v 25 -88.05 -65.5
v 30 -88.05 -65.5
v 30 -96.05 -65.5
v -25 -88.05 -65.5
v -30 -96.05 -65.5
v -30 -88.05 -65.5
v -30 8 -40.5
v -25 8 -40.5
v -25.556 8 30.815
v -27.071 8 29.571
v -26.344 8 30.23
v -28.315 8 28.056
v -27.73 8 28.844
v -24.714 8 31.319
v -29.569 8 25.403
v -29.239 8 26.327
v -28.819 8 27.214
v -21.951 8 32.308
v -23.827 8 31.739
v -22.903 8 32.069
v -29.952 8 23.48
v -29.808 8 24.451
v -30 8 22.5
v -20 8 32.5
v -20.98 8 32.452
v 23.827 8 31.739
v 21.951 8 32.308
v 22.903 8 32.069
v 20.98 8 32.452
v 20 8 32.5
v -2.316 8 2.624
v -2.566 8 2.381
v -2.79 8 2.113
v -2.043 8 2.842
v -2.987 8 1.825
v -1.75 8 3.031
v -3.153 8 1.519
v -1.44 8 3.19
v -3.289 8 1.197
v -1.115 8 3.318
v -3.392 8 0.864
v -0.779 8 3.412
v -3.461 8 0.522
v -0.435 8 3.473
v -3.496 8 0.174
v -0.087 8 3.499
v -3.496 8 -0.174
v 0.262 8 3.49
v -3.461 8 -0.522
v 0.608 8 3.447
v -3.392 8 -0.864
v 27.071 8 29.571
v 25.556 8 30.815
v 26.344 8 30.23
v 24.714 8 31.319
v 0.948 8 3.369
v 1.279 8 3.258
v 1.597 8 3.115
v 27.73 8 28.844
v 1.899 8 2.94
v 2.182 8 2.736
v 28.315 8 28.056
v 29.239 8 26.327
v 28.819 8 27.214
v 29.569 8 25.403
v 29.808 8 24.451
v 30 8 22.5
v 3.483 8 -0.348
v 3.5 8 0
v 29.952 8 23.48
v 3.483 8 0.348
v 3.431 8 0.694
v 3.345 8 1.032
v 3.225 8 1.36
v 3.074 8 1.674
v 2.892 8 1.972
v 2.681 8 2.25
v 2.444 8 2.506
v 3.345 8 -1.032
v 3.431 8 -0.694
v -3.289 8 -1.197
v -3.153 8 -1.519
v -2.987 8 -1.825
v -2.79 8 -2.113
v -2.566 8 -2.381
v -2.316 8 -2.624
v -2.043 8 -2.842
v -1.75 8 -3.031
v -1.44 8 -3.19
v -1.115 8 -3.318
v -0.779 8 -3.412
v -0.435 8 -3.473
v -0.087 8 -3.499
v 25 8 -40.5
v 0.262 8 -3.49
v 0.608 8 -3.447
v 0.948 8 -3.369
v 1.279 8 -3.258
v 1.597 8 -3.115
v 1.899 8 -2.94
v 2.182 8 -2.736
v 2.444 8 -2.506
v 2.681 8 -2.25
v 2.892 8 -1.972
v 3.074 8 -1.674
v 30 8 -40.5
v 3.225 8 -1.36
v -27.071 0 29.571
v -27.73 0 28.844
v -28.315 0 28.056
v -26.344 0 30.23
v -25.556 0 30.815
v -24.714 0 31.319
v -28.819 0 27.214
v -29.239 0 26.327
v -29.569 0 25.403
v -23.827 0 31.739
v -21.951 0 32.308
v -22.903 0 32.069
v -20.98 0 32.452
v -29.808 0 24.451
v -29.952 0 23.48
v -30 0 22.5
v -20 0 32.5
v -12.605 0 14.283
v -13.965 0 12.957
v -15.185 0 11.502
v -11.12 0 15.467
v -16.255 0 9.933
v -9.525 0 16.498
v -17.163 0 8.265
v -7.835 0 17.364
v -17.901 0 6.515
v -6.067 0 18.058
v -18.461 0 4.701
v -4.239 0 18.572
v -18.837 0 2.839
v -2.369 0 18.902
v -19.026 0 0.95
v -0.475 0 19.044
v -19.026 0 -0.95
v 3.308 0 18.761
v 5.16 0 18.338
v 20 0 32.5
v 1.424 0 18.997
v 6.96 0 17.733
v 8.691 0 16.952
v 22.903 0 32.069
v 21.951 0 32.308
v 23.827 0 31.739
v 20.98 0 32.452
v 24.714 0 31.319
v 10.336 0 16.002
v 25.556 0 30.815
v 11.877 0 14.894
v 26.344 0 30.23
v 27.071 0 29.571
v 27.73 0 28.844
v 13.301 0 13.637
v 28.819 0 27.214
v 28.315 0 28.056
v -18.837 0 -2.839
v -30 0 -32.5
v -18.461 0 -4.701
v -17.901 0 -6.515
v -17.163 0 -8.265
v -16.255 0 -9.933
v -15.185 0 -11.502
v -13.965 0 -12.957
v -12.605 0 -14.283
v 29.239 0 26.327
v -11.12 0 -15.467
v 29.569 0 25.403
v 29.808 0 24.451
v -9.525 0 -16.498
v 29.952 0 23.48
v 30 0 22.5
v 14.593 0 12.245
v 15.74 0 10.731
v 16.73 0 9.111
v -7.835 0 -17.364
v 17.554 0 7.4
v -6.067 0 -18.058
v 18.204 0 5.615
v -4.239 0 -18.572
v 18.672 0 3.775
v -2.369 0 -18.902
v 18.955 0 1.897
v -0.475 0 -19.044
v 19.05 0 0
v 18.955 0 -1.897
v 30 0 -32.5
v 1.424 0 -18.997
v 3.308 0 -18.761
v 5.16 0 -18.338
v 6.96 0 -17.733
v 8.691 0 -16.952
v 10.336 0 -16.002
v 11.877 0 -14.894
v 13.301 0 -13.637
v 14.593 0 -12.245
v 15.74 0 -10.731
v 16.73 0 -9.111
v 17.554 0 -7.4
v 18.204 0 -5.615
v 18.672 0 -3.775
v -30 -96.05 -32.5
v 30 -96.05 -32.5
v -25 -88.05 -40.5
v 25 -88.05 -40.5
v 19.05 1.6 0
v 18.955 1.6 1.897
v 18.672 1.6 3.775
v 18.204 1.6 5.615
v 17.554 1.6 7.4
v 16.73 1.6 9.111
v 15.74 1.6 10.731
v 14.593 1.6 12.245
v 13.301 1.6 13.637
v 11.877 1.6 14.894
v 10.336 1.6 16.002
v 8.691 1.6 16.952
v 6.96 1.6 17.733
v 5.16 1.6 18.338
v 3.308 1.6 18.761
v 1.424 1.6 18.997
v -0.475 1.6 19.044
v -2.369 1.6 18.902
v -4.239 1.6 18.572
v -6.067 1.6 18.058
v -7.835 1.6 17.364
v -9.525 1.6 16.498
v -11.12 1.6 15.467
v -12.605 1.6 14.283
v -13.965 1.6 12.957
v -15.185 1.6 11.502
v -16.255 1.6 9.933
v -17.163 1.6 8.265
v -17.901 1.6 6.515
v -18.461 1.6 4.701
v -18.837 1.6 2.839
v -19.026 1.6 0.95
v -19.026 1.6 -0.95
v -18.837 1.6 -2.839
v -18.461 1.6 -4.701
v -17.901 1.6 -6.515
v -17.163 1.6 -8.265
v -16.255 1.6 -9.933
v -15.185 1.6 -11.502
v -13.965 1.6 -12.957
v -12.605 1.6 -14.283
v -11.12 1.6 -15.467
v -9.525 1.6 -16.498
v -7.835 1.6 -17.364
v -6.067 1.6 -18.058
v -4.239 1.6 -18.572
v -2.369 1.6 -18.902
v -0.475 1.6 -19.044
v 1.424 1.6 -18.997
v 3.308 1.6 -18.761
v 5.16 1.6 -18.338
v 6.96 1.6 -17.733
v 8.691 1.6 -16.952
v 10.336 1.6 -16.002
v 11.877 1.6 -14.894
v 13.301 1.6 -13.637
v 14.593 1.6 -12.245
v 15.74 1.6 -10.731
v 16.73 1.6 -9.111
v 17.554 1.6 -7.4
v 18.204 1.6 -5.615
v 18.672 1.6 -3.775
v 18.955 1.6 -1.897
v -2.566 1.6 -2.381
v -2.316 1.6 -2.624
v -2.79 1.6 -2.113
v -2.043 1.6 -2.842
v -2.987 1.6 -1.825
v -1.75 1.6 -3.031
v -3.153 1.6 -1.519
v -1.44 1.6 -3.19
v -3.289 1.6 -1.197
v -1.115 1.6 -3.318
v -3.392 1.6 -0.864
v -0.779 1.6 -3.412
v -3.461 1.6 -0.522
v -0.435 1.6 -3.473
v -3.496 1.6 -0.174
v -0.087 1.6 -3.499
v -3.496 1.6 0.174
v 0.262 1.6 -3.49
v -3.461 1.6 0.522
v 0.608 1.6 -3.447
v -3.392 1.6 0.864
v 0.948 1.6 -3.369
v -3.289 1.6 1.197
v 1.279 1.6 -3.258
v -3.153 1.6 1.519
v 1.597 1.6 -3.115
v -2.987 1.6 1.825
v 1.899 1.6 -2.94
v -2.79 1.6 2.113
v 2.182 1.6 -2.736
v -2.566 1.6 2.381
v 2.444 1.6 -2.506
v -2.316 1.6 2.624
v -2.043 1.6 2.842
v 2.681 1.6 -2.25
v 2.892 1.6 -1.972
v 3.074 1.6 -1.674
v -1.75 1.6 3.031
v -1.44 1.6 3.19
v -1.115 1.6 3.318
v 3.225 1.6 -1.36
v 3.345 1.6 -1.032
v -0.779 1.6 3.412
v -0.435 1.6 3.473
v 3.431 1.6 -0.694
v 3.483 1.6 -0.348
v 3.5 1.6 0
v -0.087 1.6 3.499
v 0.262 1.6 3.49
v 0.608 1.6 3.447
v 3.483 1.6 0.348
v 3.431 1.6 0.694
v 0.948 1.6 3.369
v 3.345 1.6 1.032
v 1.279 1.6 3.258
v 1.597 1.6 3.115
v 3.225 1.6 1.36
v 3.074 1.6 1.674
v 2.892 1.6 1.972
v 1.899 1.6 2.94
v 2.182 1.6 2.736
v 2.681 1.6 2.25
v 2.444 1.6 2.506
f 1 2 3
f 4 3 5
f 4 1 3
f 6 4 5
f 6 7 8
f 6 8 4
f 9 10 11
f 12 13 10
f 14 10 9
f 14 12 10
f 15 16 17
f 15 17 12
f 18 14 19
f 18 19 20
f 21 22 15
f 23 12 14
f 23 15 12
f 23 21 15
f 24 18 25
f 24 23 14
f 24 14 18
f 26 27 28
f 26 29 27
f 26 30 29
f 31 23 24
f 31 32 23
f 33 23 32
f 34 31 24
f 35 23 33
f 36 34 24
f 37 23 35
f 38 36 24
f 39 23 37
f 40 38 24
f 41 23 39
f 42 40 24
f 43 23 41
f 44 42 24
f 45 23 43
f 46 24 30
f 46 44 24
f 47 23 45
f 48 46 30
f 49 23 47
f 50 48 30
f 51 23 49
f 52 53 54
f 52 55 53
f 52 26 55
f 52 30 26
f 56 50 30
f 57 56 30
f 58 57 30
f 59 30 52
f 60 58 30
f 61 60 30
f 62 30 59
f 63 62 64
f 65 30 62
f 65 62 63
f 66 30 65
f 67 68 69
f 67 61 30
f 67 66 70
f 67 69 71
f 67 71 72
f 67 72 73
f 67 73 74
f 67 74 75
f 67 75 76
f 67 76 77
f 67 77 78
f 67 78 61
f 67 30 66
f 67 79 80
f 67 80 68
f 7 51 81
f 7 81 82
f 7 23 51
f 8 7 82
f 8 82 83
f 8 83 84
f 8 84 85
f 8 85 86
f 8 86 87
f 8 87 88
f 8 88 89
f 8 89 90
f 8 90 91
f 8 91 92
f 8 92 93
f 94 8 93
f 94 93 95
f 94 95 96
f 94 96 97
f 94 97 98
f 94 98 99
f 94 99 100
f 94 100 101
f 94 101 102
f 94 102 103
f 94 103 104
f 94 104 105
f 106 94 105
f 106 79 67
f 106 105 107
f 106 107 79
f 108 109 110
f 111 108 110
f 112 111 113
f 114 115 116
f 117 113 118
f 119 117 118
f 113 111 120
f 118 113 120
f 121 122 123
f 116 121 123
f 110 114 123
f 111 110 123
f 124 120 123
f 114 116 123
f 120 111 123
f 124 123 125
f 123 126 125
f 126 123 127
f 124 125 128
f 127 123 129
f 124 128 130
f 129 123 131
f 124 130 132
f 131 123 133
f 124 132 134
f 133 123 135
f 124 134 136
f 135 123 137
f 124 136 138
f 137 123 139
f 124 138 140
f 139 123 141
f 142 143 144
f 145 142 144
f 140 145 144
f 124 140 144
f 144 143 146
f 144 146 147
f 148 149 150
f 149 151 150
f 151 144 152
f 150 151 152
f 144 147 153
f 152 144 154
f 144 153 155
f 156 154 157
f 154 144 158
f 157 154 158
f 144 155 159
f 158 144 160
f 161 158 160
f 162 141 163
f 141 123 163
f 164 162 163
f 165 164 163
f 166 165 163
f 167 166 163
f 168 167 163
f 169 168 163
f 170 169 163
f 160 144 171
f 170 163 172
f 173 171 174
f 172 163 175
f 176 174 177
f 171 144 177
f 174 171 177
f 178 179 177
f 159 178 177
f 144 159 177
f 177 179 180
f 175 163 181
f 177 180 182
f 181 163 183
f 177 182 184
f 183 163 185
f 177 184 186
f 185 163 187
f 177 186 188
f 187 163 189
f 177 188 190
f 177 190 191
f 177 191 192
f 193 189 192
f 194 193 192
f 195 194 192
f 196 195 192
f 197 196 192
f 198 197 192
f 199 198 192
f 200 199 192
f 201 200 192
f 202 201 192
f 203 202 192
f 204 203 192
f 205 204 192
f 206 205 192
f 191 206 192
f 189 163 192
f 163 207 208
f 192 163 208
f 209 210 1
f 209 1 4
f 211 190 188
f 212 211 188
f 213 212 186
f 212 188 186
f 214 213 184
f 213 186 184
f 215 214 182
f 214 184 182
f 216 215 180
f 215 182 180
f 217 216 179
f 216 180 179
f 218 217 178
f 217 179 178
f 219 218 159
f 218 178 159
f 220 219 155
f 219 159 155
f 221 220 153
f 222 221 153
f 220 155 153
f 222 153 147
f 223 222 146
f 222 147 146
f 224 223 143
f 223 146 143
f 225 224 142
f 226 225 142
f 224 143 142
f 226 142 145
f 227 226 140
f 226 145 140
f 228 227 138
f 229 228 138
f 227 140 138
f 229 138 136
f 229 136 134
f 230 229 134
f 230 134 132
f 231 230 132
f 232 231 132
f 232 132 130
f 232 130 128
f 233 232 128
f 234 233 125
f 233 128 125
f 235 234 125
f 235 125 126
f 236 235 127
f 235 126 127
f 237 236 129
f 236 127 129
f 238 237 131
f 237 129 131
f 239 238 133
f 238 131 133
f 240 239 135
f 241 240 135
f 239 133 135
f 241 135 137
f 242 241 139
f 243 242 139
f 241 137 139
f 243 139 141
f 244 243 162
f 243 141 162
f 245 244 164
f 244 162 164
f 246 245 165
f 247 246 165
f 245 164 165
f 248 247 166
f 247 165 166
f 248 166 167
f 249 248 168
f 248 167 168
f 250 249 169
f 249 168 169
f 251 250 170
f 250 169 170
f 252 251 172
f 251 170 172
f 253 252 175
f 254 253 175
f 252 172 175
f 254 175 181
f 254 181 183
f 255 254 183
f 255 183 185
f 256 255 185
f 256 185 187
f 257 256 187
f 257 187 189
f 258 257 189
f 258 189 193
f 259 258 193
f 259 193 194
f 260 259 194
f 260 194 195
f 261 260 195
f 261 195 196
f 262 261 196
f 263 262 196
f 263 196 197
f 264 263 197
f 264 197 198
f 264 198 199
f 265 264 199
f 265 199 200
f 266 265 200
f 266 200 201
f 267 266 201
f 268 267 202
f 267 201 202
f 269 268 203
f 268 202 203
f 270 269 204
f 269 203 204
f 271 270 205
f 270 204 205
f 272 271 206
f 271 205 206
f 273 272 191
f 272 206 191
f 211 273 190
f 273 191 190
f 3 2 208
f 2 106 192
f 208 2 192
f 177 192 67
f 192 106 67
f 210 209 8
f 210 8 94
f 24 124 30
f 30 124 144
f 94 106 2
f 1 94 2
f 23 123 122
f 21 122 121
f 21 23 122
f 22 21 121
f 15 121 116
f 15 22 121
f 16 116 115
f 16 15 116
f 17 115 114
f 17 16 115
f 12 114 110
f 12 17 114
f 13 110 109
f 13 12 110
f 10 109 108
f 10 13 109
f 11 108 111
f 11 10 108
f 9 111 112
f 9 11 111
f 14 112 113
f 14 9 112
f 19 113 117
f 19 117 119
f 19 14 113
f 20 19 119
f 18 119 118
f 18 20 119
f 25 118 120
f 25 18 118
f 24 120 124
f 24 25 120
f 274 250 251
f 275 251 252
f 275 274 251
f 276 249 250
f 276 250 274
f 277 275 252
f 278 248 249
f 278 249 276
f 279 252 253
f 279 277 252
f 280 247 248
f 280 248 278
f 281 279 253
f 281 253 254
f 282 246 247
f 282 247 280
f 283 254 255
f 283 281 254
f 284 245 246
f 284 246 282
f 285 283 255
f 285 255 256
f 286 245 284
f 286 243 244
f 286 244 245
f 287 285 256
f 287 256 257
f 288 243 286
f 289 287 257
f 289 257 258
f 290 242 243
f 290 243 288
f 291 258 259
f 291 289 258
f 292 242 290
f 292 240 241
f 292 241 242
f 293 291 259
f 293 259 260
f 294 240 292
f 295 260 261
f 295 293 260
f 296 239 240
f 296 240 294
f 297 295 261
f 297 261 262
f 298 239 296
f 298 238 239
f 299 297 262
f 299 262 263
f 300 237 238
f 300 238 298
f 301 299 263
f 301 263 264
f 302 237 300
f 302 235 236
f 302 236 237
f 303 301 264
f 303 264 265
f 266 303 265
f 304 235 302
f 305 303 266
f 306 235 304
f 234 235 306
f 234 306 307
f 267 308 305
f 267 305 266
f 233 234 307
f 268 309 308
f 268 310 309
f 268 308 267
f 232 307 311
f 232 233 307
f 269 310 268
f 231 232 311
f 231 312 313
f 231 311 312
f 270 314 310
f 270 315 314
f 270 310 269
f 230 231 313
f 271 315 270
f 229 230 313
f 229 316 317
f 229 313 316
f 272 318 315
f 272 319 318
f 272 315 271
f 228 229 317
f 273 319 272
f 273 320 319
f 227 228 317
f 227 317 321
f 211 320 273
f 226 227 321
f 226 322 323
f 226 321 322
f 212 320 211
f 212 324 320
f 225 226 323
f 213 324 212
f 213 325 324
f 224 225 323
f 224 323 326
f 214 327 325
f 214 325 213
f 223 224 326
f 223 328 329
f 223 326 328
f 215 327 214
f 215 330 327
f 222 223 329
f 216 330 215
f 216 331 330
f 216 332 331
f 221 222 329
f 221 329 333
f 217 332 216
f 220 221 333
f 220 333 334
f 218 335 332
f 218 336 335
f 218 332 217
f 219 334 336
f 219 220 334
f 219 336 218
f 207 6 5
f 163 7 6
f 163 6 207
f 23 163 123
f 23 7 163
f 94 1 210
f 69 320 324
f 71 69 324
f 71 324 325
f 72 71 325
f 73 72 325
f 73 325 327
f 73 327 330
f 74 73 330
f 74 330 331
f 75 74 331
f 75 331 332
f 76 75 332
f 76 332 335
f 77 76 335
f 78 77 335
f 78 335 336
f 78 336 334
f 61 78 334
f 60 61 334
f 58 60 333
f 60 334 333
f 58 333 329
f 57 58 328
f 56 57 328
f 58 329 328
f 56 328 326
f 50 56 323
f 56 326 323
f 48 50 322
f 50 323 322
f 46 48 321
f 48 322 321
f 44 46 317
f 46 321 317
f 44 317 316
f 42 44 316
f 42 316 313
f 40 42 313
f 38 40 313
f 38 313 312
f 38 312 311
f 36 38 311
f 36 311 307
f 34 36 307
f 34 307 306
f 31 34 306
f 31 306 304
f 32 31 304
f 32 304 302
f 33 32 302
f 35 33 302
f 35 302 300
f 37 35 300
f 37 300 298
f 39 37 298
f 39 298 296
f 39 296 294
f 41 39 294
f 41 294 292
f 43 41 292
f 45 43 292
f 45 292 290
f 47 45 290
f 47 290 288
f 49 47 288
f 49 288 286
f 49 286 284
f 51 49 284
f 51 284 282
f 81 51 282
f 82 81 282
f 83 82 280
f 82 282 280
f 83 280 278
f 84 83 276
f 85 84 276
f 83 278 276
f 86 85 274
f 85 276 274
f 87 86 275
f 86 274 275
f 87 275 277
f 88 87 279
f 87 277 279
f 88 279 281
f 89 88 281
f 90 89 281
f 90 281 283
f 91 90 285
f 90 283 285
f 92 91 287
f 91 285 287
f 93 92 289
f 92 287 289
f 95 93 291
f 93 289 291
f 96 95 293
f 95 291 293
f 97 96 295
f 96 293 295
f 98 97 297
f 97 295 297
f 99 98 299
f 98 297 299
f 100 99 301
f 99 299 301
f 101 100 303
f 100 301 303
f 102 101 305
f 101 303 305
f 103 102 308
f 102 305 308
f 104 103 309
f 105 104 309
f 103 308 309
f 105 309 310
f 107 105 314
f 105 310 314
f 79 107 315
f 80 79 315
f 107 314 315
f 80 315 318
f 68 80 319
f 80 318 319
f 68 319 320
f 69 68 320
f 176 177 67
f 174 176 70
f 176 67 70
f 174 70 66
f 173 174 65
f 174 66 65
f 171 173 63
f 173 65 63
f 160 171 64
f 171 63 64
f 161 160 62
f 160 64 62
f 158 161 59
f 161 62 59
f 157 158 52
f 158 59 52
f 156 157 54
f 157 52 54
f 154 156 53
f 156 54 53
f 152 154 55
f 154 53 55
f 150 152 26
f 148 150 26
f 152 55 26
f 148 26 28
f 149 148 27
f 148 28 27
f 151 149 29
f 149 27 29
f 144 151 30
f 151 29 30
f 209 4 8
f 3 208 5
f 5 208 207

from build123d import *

# Parameters (mm, degrees)
SKETCH1_W           = 60
SKETCH1_H           = 65
BOSS_EXTRUDE1_DEPTH = 8
SKETCH2_R           = 19.05
CUT_EXTRUDE1_DEPTH  = 1.6
SKETCH3_R           = 3.5
CUT_EXTRUDE2_DEPTH  = 7.4
SKETCH4_W           = 60
SKETCH4_H           = 8
BOSS_EXTRUDE2_DEPTH = 104.05
FILLET1_R           = 10
SKETCH5_W           = 60
SKETCH5_H           = 8
BOSS_EXTRUDE3_DEPTH = 25
BOSS_EXTRUDE4_DEPTH = 5


with BuildPart() as part:
    # Sketch1 → Boss-Extrude1 (new body)
    with BuildSketch(Plane(origin=(0, 0, 0), x_dir=(1, 0, 0), z_dir=(0, 1, 0))):
        Rectangle(SKETCH1_W, SKETCH1_H)
    extrude(amount=BOSS_EXTRUDE1_DEPTH)

    # Sketch2 → Cut-Extrude1 (cut)
    with BuildSketch(Plane.XZ):
        Circle(SKETCH2_R)
    extrude(amount=-CUT_EXTRUDE1_DEPTH, mode=Mode.SUBTRACT)

    # Sketch3 → Cut-Extrude2 (cut, through all)
    with BuildSketch(Plane.XZ.offset(-1.6)):
        Circle(SKETCH3_R)
    extrude(amount=-CUT_EXTRUDE2_DEPTH, mode=Mode.SUBTRACT)

    # Sketch4 → Boss-Extrude2 (add)
    with BuildSketch(Plane(origin=(0, 8, 0), x_dir=(1, 0, 0), z_dir=(0, 1, 0))):
        with Locations((0, 36.5)):
            Rectangle(SKETCH4_W, SKETCH4_H)
    extrude(amount=-BOSS_EXTRUDE2_DEPTH)

    # Fillet1
    fillet1_edges = [part.edges().sort_by_distance(p)[0] for p in [
        (-30, 4, 32.5),
        (30, 4, 32.5),
    ]]
    fillet(fillet1_edges, radius=FILLET1_R)

    # Sketch5 → Boss-Extrude3 (add)
    with BuildSketch(Plane(origin=(0, 0, -40.5), x_dir=(-1, 0, 0), z_dir=(0, 0, -1))):
        with Locations((0, -92.05)):
            Rectangle(SKETCH5_W, SKETCH5_H)
    extrude(amount=BOSS_EXTRUDE3_DEPTH)

    # Sketch6 → Boss-Extrude4 (add)
    with BuildSketch(Plane(origin=(30, 0, 0), x_dir=(0, 0, -1), z_dir=(1, 0, 0))):
        Polygon((40.5, 8), (65.5, -88.05), (40.5, -88.05), align=None)
    boss_extrude4 = extrude(amount=-BOSS_EXTRUDE4_DEPTH)

    # Mirror1: Boss-Extrude4 across plane
    add(boss_extrude4.mirror(Plane(origin=(0, 0, 0), x_dir=(0, 0, 1), z_dir=(1, 0, 0))))


solid = part.part
